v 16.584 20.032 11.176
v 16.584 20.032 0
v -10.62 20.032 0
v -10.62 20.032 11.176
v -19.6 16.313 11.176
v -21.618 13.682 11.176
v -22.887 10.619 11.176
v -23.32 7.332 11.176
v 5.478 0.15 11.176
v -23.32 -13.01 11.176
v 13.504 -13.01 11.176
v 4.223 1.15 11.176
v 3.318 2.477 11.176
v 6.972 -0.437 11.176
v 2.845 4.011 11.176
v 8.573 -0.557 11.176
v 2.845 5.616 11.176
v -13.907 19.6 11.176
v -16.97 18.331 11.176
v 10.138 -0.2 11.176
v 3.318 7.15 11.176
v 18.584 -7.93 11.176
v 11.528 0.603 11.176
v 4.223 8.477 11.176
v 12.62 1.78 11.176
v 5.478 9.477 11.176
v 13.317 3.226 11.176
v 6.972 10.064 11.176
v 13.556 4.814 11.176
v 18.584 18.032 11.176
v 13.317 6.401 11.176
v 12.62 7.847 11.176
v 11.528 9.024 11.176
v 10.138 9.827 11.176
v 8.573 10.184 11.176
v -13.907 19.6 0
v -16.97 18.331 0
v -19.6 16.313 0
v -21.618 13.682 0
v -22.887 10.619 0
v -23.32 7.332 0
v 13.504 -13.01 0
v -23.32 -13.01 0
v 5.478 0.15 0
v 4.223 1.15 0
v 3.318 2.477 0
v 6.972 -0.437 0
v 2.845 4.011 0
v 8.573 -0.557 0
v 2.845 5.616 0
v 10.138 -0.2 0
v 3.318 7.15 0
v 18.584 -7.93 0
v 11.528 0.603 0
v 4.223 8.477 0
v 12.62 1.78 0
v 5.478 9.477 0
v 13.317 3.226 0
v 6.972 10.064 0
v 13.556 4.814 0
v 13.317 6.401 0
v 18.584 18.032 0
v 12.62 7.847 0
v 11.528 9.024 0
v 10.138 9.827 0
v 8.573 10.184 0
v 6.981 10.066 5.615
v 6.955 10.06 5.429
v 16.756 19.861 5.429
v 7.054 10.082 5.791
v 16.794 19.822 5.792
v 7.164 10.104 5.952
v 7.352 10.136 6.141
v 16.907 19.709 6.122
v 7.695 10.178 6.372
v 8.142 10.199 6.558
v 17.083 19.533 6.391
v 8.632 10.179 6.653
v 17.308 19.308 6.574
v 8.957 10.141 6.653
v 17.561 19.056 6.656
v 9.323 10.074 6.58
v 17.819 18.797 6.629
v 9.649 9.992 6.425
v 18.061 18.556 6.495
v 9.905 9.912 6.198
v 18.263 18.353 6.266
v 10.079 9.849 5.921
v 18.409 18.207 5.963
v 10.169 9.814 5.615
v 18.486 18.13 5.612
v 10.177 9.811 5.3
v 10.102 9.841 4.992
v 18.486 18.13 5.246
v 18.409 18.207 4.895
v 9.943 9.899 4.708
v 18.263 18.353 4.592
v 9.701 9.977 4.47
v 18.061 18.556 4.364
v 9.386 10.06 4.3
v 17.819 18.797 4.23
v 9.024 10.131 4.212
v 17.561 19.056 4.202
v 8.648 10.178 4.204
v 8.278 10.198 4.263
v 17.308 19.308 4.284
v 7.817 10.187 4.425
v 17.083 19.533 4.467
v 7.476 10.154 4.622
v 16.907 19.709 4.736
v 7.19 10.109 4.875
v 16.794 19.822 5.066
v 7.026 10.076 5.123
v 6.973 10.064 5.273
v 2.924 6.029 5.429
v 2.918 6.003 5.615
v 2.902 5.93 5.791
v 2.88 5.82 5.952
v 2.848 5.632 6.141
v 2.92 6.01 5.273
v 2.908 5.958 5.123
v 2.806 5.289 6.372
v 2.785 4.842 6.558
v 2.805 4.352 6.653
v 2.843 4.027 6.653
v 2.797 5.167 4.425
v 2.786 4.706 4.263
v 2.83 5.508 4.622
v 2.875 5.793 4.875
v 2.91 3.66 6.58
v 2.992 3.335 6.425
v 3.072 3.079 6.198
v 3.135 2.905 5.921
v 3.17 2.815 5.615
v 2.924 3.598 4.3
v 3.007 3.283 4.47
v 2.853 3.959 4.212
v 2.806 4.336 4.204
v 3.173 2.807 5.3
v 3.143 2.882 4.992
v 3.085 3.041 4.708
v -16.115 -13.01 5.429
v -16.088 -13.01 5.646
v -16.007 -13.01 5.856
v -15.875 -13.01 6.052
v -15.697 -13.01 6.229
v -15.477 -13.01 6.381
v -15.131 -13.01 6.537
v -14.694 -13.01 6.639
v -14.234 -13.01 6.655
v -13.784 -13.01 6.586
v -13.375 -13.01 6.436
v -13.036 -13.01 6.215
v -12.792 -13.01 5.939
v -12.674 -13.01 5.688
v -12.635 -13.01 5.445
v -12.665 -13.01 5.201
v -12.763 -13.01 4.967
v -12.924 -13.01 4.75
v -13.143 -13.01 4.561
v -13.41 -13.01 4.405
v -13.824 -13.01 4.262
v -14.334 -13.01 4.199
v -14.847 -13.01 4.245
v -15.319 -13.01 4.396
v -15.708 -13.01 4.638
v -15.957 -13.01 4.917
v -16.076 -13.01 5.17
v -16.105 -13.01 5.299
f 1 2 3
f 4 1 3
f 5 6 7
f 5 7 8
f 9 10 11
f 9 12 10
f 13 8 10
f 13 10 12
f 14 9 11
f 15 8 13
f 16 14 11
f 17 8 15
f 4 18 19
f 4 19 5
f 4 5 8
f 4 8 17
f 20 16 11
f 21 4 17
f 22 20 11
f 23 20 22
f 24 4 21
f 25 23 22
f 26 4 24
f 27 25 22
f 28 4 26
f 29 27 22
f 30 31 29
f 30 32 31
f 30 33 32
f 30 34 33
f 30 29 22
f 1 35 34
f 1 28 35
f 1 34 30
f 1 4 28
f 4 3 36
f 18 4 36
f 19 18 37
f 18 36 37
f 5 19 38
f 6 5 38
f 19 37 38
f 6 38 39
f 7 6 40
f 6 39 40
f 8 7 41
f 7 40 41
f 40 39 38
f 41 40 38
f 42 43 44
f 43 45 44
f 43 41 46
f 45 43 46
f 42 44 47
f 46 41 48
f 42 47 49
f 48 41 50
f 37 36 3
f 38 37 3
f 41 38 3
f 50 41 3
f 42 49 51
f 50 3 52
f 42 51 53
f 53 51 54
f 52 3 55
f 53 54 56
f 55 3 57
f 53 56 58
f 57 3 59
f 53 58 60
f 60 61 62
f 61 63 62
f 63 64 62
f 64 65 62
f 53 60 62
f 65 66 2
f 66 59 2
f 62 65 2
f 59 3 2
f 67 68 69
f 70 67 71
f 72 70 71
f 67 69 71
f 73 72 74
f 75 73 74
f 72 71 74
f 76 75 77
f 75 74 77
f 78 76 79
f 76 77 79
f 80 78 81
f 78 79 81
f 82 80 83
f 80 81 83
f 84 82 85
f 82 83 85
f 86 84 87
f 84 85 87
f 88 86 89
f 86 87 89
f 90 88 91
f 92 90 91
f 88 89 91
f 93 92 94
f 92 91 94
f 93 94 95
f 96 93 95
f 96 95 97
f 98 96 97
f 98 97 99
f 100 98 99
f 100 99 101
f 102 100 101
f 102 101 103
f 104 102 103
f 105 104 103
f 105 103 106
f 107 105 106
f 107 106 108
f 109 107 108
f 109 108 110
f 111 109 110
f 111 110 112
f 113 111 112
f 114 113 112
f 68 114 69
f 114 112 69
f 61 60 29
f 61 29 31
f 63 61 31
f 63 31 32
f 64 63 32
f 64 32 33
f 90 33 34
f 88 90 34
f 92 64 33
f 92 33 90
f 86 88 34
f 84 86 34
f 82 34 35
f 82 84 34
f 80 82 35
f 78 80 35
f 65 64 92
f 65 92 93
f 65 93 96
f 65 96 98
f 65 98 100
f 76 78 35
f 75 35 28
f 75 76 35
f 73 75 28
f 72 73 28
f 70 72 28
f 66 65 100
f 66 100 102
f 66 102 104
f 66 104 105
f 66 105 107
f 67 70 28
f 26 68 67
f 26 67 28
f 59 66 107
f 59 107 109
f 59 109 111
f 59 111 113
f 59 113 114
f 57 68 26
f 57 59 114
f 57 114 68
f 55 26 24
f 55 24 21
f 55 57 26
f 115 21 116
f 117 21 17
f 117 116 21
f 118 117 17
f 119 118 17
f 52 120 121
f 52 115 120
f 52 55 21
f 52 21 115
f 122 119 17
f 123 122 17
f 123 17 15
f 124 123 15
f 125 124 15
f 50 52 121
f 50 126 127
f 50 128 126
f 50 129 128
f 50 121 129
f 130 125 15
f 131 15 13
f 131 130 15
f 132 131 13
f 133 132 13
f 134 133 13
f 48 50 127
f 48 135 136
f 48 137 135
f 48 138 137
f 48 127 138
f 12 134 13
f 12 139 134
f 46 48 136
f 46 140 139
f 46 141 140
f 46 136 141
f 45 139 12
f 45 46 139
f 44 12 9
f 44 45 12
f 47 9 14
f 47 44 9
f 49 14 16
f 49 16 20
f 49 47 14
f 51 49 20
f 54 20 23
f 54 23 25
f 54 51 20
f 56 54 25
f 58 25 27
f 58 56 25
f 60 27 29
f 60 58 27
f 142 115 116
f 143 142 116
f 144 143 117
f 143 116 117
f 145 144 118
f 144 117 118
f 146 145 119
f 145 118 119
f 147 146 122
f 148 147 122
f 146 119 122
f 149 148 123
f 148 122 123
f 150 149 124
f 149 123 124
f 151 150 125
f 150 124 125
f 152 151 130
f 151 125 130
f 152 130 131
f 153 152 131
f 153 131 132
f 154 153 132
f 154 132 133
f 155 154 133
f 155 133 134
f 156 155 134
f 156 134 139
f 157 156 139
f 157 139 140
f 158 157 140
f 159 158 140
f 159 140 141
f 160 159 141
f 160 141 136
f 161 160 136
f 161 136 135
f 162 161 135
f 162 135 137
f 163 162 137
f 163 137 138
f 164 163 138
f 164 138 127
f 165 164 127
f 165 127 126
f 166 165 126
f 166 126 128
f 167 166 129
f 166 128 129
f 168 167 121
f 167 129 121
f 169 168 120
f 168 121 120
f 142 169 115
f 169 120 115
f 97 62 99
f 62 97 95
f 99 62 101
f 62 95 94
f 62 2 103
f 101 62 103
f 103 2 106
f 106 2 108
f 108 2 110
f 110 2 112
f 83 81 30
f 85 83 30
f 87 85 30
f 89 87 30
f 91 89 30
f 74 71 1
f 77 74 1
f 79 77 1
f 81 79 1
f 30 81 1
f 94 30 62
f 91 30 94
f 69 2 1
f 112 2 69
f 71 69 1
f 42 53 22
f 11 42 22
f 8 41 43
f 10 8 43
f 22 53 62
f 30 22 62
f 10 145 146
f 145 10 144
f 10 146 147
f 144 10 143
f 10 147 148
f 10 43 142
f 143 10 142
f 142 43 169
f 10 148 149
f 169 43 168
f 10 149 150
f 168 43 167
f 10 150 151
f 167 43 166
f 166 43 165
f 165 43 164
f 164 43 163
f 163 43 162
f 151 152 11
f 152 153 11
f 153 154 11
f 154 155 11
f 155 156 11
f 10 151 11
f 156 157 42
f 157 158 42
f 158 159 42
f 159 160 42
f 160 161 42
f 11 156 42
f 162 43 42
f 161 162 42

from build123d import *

# Parameters (mm, degrees)
F0_R     = 5.385416
F1_DEPTH = 11.176
F2_SIZE  = 5.08
F3_SIZE  = 2
F4_R     = 1.230304
F5_DEPTH = 64.516


with BuildPart() as f1:
    # F0 (on Top) → F1 (new body)
    with BuildSketch(Plane.XY):
        with BuildLine():
            Line((-23.319686, 7.332434), (-23.319686, -13.010174))
            Line((-23.319686, -13.010174), (18.583678, -13.010174))
            Line((18.583678, -13.010174), (18.583678, 20.032434))
            Line((18.583678, 20.032434), (-10.619686, 20.032434))
            ThreePointArc((-10.619686, 20.032434), (-19.599942, 16.31269), (-23.319686, 7.332434))
        make_face()
        with Locations((8.170361, 4.813509)):
            Circle(F0_R, mode=Mode.SUBTRACT)
    extrude(amount=F1_DEPTH)

    # F2
    f2_edges = [f1.edges().sort_by_distance(p)[0] for p in [
        (18.583678, -13.010174, 5.588),
    ]]
    chamfer(f2_edges, length=F2_SIZE)

    # F3
    f3_edges = [f1.edges().sort_by_distance(p)[0] for p in [
        (18.583678, 20.032434, 5.588),
    ]]
    chamfer(f3_edges, length=F3_SIZE)

    # F4 (on face) → F5 (cut)
    with BuildSketch(Plane(origin=(18.308056, 18.308056, 0), x_dir=(-0.707107, 0.707107, 0), z_dir=(0.707107, 0.707107, 0))):
        with Locations((0.965202, 5.429061)):
            Circle(F4_R)
    extrude(amount=-F5_DEPTH, mode=Mode.SUBTRACT)


solid = f1.part
